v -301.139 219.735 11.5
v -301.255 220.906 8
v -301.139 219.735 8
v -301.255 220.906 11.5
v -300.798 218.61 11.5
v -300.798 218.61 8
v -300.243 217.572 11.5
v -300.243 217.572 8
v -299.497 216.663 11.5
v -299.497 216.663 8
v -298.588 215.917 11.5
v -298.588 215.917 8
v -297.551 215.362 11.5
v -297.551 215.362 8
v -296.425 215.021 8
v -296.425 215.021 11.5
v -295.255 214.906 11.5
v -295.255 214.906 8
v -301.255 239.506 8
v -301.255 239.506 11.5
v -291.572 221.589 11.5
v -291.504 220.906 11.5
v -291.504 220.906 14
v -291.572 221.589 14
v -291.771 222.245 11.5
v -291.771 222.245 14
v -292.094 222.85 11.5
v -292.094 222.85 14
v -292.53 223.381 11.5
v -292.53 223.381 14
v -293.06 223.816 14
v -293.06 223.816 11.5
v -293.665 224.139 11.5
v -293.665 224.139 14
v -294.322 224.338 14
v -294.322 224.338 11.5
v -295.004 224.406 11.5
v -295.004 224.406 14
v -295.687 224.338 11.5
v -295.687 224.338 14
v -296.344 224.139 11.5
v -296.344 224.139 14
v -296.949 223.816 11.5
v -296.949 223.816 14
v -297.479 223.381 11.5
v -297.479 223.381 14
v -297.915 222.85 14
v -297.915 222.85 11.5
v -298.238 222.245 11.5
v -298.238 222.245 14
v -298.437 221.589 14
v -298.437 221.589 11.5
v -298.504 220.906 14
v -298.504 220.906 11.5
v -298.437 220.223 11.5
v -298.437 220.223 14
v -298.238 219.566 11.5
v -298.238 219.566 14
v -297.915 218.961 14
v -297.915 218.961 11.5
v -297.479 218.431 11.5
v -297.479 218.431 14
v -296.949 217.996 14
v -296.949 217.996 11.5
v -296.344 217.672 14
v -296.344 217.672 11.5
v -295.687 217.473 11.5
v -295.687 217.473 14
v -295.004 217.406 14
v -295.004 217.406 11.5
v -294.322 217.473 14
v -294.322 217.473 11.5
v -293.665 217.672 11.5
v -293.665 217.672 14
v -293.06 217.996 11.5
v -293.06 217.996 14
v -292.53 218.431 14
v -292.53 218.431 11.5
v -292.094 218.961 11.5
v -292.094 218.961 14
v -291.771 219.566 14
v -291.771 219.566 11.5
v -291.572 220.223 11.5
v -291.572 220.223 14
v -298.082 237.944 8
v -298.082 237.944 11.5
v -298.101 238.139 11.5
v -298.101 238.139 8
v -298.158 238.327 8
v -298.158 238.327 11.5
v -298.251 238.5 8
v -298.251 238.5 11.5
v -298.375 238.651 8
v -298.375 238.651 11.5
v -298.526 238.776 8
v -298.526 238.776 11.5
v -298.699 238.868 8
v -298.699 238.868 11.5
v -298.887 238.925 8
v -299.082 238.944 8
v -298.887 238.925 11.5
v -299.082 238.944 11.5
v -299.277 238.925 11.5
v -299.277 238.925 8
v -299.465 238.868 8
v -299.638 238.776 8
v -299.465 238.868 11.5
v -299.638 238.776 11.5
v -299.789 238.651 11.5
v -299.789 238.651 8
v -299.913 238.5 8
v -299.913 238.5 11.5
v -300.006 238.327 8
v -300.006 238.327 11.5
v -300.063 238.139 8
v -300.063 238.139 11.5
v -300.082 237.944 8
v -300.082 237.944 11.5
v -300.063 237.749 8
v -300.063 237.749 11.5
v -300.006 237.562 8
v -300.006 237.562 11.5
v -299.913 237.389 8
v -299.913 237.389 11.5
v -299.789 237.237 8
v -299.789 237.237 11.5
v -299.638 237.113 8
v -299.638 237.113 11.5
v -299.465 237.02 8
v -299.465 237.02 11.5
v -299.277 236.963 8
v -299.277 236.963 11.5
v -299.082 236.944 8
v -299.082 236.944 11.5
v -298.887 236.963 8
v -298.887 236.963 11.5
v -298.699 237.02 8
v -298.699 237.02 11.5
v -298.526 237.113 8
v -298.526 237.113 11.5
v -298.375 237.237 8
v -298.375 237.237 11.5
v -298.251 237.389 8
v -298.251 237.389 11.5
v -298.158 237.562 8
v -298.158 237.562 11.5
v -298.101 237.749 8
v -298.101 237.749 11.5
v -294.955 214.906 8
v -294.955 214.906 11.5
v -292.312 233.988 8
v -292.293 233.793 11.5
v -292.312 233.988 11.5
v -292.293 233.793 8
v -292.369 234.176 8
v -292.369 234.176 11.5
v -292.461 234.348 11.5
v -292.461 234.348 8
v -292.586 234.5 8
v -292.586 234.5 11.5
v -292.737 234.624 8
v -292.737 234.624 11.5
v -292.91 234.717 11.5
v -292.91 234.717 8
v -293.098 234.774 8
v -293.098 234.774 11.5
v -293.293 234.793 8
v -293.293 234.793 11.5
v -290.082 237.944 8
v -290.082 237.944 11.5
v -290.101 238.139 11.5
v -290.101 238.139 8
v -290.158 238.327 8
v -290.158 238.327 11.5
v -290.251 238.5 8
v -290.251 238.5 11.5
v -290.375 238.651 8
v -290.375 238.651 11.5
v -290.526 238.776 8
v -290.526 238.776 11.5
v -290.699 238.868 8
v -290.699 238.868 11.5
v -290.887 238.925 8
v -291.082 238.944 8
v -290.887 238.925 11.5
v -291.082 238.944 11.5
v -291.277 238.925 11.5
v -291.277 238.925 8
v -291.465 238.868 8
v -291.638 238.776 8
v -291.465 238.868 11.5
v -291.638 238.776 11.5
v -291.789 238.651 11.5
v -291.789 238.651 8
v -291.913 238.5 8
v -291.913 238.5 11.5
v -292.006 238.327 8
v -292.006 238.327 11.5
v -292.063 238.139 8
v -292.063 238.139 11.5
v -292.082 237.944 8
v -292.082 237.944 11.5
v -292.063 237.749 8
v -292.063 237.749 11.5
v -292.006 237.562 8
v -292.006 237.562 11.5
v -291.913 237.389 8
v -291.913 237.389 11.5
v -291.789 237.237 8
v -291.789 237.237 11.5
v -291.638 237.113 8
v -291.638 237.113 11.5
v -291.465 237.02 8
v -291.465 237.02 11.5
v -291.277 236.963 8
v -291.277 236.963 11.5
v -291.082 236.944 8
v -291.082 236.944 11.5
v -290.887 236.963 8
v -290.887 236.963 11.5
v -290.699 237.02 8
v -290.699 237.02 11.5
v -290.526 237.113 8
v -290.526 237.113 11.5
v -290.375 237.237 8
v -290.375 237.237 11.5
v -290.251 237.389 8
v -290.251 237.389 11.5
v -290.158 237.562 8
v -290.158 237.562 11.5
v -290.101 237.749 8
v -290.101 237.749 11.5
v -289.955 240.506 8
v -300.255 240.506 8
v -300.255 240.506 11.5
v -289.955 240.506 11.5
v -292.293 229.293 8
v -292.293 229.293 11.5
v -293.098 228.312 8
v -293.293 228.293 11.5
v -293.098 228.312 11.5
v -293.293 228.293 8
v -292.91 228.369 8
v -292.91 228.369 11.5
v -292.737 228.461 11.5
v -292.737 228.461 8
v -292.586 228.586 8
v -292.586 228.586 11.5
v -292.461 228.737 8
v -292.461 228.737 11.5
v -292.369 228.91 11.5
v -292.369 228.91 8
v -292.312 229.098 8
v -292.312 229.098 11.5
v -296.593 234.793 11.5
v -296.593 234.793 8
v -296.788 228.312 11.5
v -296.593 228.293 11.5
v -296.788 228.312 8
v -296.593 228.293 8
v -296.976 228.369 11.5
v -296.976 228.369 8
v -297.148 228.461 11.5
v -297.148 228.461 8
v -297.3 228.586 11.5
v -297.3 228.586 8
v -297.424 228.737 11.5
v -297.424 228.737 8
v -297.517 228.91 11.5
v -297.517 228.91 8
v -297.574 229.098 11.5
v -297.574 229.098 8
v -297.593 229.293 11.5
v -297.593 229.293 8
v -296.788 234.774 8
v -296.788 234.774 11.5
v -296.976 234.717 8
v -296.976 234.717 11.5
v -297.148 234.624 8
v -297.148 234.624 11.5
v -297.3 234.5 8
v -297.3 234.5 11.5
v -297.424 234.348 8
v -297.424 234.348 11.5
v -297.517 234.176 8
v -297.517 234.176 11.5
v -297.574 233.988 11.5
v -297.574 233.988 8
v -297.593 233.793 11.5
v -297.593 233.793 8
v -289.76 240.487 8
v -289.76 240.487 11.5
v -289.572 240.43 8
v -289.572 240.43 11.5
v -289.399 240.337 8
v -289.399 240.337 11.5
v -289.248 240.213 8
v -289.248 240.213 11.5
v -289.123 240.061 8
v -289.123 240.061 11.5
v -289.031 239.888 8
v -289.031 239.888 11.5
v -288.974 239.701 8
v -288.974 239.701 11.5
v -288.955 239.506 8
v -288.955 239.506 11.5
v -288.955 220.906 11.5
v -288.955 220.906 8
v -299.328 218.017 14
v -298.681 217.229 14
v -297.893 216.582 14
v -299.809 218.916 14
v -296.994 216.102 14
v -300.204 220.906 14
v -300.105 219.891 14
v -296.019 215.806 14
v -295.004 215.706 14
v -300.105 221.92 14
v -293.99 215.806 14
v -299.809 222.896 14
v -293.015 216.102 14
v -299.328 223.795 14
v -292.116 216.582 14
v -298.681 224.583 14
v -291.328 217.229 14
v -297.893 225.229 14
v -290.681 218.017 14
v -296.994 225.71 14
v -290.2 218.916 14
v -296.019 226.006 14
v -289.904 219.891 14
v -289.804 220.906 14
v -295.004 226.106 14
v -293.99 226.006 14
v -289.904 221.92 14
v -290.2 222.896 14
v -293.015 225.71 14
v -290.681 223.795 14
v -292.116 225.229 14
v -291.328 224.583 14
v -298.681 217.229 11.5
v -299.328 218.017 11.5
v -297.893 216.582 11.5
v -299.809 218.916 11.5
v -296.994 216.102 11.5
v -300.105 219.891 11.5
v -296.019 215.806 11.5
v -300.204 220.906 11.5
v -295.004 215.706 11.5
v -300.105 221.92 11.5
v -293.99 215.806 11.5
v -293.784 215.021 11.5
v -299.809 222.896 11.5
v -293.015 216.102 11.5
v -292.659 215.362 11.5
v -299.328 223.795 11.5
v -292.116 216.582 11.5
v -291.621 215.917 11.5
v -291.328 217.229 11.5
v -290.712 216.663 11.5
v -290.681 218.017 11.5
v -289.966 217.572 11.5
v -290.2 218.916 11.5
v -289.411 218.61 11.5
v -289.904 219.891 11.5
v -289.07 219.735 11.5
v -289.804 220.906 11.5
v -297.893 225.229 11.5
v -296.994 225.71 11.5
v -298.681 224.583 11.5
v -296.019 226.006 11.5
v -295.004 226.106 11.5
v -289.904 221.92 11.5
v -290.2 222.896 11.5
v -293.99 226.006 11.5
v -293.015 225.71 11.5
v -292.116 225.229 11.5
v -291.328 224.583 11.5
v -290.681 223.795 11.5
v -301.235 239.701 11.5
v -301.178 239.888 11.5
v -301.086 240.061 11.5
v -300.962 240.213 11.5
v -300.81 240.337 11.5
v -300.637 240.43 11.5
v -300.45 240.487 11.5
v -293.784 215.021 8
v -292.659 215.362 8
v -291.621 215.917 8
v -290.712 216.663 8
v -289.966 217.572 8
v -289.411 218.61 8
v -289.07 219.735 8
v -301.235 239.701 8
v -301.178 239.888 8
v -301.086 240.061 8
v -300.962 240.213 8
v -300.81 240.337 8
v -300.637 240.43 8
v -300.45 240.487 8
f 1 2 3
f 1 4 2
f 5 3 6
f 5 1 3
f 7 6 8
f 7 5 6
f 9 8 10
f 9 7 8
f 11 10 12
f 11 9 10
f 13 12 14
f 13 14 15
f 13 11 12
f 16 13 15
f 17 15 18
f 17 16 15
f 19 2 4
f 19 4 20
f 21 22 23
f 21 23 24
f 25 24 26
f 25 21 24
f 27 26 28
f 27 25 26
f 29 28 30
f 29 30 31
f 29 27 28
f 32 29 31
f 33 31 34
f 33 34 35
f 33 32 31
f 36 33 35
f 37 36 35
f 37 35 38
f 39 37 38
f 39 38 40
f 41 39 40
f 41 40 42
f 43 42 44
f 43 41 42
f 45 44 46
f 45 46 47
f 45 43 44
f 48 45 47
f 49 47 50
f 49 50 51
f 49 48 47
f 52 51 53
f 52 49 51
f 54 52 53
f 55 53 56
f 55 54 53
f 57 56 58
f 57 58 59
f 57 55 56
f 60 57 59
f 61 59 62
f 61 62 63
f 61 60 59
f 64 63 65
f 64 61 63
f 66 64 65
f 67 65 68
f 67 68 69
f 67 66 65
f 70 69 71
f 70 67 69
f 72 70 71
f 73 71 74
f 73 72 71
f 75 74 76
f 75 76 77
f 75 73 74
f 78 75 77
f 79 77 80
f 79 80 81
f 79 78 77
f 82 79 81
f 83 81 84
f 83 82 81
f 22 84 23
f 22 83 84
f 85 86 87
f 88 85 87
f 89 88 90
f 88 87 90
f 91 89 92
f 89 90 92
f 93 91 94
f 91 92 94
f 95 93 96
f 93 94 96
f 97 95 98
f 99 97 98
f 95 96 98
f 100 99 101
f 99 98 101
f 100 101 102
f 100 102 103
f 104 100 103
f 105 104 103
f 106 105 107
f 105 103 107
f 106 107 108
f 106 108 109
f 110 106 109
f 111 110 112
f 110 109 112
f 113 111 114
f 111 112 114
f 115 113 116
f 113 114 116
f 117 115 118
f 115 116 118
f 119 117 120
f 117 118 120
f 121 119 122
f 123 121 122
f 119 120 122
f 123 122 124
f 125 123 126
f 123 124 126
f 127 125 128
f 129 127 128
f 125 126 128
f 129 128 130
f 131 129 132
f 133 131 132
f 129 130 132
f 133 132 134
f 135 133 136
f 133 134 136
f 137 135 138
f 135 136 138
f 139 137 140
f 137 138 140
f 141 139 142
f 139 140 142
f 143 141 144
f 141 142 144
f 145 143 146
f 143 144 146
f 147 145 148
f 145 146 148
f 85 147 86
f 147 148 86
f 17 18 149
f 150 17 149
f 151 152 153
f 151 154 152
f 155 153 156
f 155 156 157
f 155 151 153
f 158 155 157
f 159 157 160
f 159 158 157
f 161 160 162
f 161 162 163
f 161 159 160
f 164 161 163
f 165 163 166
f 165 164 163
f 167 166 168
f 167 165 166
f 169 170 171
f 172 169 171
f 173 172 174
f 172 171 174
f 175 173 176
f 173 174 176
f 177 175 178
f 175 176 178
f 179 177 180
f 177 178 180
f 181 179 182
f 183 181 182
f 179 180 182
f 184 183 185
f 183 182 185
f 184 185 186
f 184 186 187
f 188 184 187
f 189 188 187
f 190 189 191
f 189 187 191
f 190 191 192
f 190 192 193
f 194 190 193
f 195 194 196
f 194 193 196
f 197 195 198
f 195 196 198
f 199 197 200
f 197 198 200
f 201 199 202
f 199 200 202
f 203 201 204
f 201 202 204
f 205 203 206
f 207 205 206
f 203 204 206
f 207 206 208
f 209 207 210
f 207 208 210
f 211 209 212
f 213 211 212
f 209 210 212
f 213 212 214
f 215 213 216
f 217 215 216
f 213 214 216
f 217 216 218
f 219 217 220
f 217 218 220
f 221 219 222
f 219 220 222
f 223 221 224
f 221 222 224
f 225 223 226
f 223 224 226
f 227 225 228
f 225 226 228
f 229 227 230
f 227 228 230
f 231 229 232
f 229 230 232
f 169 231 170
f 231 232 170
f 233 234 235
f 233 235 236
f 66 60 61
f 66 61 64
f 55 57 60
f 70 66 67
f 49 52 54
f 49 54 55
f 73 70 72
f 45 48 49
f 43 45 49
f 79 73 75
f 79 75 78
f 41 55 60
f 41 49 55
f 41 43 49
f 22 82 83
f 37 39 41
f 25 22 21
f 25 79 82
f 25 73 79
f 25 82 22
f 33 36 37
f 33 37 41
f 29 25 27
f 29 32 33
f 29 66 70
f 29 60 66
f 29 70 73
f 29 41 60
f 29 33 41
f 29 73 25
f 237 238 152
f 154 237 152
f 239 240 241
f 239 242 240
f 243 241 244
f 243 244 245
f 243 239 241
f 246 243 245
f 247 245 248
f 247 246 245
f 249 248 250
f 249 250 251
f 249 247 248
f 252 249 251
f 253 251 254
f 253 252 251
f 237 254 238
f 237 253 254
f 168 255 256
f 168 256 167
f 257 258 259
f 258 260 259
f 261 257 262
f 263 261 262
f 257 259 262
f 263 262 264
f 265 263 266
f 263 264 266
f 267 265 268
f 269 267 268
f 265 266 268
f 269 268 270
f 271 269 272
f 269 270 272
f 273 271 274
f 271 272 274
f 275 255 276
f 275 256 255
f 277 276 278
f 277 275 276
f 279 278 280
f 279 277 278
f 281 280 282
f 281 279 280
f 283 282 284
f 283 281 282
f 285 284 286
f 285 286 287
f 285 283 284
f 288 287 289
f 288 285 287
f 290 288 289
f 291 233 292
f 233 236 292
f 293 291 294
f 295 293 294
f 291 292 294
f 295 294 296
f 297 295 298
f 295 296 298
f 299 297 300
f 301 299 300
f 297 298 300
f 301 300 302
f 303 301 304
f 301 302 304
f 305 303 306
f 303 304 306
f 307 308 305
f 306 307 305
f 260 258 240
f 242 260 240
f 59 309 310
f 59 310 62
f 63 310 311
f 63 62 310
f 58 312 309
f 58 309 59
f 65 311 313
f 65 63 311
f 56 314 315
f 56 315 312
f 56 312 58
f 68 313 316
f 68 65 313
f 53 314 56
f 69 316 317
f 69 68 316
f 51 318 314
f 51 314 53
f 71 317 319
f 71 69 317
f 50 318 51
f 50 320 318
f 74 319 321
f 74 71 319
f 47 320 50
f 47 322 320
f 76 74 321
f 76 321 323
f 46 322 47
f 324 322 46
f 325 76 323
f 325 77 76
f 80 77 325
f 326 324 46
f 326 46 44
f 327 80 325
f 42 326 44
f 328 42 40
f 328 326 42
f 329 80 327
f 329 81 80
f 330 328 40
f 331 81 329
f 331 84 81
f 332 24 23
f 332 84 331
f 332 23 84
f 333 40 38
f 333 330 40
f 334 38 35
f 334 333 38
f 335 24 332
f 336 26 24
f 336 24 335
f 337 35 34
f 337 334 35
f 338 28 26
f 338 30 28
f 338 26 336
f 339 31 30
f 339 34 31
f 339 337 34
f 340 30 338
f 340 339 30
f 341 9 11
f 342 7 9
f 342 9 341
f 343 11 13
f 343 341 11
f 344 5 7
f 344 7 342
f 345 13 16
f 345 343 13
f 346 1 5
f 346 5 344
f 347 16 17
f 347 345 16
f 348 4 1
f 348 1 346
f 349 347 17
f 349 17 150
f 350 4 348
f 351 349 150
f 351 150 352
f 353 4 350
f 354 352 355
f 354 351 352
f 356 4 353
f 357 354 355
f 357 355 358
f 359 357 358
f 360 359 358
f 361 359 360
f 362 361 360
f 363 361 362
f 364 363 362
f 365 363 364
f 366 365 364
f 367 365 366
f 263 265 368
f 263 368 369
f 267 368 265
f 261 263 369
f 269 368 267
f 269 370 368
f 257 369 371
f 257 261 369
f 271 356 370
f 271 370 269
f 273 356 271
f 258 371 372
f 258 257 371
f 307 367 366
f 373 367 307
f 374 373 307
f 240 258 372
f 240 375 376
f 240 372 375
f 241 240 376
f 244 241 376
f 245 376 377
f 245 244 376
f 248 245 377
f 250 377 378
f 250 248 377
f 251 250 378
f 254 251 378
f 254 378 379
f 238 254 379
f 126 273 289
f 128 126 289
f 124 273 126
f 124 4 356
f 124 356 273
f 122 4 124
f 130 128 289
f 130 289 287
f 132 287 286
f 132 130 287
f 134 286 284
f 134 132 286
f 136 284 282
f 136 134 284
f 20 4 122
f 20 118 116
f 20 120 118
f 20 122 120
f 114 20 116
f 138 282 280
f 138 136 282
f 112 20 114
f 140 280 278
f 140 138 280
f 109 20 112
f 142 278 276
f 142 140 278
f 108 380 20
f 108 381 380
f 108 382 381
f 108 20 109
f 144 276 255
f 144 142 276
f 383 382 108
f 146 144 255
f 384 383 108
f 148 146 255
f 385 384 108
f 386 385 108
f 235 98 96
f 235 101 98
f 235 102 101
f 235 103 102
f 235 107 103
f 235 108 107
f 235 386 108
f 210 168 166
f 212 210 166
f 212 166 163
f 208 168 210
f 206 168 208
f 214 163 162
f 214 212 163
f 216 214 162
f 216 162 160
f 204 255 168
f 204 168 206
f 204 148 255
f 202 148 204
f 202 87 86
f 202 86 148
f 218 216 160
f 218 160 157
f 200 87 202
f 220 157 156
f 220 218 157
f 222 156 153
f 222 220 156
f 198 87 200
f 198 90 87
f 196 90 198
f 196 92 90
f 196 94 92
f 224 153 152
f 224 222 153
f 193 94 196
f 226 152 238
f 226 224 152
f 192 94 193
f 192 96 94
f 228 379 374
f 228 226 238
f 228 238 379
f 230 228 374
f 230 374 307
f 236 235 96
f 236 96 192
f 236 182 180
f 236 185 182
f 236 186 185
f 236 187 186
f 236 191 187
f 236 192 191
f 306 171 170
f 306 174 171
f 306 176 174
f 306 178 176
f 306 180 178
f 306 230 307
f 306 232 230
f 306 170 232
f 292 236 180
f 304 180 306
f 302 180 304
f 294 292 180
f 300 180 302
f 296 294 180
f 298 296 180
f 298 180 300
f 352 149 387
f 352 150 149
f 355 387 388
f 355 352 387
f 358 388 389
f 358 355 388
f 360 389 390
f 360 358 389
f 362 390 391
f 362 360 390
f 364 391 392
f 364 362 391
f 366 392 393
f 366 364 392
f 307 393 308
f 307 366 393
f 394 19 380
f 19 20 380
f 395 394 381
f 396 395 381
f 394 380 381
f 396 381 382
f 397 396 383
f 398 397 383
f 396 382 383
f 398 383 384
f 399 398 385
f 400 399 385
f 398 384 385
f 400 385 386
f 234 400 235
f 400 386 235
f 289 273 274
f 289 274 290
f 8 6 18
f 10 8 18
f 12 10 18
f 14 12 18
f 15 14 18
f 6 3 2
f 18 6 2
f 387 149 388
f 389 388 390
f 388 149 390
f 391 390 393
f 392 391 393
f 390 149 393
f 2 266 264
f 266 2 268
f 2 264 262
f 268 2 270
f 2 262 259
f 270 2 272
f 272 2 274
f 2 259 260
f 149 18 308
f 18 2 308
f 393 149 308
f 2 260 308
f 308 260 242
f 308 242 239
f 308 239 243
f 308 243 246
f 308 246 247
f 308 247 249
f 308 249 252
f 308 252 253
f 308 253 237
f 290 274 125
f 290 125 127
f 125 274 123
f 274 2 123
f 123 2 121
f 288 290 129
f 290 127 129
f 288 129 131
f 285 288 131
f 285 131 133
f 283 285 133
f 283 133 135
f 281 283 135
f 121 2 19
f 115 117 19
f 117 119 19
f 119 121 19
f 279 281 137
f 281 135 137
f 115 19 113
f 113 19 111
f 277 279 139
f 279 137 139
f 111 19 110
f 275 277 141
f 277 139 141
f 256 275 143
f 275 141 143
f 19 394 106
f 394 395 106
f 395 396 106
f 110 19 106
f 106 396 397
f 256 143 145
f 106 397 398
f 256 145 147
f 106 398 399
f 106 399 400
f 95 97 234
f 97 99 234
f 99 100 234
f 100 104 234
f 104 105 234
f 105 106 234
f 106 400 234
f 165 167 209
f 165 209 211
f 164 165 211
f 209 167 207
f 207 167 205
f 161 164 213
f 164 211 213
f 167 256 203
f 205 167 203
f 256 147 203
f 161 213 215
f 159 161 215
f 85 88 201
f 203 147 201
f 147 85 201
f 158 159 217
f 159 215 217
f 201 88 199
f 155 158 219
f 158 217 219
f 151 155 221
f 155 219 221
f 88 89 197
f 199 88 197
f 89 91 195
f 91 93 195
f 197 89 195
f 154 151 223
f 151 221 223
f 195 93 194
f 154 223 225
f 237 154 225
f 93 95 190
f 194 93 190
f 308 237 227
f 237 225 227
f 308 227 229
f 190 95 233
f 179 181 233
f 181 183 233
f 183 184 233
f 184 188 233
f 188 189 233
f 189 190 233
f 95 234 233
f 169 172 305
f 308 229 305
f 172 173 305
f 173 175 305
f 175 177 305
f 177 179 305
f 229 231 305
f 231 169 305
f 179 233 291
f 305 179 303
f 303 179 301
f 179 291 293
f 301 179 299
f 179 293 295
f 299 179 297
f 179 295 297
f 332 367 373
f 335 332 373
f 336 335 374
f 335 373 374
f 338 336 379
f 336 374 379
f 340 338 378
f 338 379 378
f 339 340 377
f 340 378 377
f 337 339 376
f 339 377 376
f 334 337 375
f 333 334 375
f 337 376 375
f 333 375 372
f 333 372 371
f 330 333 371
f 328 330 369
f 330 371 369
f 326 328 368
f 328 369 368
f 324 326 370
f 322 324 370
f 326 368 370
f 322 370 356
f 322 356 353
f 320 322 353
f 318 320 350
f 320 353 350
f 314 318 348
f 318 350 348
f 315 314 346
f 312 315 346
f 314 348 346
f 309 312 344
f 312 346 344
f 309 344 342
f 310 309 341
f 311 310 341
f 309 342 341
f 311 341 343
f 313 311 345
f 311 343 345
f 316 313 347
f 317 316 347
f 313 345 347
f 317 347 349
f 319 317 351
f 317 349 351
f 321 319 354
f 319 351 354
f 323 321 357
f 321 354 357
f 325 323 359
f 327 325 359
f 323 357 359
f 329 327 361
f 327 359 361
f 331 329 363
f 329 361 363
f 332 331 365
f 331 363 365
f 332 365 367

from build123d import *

# Parameters (mm, degrees)
SKETCH2_W           = 12.3
SKETCH2_H           = 25.6
BOSS_EXTRUDE2_DEPTH = 3.5
SKETCH3_R           = 1
SKETCH3_W           = 5.3
SKETCH3_H           = 6.5
CUT_EXTRUDE1_DEPTH  = 3.5
FILLET1_R           = 1
FILLET2_R           = 6
SKETCH4_R           = 5.2
SKETCH4_R_2         = 3.5
BOSS_EXTRUDE3_DEPTH = 2.5


with BuildPart() as part:
    # Sketch2 → Boss-Extrude2 (new body)
    with BuildSketch(Plane.XY.offset(8)):
        with Locations((-295.104618969, 227.705749953)):
            Rectangle(SKETCH2_W, SKETCH2_H)
    extrude(amount=BOSS_EXTRUDE2_DEPTH)

    # Sketch3 → Cut-Extrude1 (cut)
    with BuildSketch(Plane.XY.offset(11.5)):
        with Locations((-299.082028179, 237.944260964)):
            Circle(SKETCH3_R)
        with Locations((-291.082028179, 237.944260964)):
            Circle(SKETCH3_R)
        with Locations((-294.942907715, 231.542892456)):
            Rectangle(SKETCH3_W, SKETCH3_H)
    extrude(amount=-CUT_EXTRUDE1_DEPTH, mode=Mode.SUBTRACT)

    # Fillet1
    fillet1_edges = [part.edges().sort_by_distance(p)[0] for p in [
        (-297.592907715, 228.292892456, 9.75),
        (-297.592907715, 234.792892456, 9.75),
        (-292.292907715, 234.792892456, 9.75),
        (-292.292907715, 228.292892456, 9.75),
        (-301.254618969, 240.505749953, 9.75),
        (-288.954618969, 240.505749953, 9.75),
    ]]
    fillet(fillet1_edges, radius=FILLET1_R)

    # Fillet2
    fillet2_edges = [part.edges().sort_by_distance(p)[0] for p in [
        (-288.954618969, 214.905749953, 9.75),
        (-301.254618969, 214.905749953, 9.75),
    ]]
    fillet(fillet2_edges, radius=FILLET2_R)

    # Sketch4 → Boss-Extrude3 (add)
    with BuildSketch(Plane.XY.offset(11.5)):
        with Locations((-295.004474021, 220.905749953)):
            Circle(SKETCH4_R)
        with Locations((-295.004474021, 220.905749953)):
            Circle(SKETCH4_R_2, mode=Mode.SUBTRACT)
    extrude(amount=BOSS_EXTRUDE3_DEPTH)


solid = part.part
